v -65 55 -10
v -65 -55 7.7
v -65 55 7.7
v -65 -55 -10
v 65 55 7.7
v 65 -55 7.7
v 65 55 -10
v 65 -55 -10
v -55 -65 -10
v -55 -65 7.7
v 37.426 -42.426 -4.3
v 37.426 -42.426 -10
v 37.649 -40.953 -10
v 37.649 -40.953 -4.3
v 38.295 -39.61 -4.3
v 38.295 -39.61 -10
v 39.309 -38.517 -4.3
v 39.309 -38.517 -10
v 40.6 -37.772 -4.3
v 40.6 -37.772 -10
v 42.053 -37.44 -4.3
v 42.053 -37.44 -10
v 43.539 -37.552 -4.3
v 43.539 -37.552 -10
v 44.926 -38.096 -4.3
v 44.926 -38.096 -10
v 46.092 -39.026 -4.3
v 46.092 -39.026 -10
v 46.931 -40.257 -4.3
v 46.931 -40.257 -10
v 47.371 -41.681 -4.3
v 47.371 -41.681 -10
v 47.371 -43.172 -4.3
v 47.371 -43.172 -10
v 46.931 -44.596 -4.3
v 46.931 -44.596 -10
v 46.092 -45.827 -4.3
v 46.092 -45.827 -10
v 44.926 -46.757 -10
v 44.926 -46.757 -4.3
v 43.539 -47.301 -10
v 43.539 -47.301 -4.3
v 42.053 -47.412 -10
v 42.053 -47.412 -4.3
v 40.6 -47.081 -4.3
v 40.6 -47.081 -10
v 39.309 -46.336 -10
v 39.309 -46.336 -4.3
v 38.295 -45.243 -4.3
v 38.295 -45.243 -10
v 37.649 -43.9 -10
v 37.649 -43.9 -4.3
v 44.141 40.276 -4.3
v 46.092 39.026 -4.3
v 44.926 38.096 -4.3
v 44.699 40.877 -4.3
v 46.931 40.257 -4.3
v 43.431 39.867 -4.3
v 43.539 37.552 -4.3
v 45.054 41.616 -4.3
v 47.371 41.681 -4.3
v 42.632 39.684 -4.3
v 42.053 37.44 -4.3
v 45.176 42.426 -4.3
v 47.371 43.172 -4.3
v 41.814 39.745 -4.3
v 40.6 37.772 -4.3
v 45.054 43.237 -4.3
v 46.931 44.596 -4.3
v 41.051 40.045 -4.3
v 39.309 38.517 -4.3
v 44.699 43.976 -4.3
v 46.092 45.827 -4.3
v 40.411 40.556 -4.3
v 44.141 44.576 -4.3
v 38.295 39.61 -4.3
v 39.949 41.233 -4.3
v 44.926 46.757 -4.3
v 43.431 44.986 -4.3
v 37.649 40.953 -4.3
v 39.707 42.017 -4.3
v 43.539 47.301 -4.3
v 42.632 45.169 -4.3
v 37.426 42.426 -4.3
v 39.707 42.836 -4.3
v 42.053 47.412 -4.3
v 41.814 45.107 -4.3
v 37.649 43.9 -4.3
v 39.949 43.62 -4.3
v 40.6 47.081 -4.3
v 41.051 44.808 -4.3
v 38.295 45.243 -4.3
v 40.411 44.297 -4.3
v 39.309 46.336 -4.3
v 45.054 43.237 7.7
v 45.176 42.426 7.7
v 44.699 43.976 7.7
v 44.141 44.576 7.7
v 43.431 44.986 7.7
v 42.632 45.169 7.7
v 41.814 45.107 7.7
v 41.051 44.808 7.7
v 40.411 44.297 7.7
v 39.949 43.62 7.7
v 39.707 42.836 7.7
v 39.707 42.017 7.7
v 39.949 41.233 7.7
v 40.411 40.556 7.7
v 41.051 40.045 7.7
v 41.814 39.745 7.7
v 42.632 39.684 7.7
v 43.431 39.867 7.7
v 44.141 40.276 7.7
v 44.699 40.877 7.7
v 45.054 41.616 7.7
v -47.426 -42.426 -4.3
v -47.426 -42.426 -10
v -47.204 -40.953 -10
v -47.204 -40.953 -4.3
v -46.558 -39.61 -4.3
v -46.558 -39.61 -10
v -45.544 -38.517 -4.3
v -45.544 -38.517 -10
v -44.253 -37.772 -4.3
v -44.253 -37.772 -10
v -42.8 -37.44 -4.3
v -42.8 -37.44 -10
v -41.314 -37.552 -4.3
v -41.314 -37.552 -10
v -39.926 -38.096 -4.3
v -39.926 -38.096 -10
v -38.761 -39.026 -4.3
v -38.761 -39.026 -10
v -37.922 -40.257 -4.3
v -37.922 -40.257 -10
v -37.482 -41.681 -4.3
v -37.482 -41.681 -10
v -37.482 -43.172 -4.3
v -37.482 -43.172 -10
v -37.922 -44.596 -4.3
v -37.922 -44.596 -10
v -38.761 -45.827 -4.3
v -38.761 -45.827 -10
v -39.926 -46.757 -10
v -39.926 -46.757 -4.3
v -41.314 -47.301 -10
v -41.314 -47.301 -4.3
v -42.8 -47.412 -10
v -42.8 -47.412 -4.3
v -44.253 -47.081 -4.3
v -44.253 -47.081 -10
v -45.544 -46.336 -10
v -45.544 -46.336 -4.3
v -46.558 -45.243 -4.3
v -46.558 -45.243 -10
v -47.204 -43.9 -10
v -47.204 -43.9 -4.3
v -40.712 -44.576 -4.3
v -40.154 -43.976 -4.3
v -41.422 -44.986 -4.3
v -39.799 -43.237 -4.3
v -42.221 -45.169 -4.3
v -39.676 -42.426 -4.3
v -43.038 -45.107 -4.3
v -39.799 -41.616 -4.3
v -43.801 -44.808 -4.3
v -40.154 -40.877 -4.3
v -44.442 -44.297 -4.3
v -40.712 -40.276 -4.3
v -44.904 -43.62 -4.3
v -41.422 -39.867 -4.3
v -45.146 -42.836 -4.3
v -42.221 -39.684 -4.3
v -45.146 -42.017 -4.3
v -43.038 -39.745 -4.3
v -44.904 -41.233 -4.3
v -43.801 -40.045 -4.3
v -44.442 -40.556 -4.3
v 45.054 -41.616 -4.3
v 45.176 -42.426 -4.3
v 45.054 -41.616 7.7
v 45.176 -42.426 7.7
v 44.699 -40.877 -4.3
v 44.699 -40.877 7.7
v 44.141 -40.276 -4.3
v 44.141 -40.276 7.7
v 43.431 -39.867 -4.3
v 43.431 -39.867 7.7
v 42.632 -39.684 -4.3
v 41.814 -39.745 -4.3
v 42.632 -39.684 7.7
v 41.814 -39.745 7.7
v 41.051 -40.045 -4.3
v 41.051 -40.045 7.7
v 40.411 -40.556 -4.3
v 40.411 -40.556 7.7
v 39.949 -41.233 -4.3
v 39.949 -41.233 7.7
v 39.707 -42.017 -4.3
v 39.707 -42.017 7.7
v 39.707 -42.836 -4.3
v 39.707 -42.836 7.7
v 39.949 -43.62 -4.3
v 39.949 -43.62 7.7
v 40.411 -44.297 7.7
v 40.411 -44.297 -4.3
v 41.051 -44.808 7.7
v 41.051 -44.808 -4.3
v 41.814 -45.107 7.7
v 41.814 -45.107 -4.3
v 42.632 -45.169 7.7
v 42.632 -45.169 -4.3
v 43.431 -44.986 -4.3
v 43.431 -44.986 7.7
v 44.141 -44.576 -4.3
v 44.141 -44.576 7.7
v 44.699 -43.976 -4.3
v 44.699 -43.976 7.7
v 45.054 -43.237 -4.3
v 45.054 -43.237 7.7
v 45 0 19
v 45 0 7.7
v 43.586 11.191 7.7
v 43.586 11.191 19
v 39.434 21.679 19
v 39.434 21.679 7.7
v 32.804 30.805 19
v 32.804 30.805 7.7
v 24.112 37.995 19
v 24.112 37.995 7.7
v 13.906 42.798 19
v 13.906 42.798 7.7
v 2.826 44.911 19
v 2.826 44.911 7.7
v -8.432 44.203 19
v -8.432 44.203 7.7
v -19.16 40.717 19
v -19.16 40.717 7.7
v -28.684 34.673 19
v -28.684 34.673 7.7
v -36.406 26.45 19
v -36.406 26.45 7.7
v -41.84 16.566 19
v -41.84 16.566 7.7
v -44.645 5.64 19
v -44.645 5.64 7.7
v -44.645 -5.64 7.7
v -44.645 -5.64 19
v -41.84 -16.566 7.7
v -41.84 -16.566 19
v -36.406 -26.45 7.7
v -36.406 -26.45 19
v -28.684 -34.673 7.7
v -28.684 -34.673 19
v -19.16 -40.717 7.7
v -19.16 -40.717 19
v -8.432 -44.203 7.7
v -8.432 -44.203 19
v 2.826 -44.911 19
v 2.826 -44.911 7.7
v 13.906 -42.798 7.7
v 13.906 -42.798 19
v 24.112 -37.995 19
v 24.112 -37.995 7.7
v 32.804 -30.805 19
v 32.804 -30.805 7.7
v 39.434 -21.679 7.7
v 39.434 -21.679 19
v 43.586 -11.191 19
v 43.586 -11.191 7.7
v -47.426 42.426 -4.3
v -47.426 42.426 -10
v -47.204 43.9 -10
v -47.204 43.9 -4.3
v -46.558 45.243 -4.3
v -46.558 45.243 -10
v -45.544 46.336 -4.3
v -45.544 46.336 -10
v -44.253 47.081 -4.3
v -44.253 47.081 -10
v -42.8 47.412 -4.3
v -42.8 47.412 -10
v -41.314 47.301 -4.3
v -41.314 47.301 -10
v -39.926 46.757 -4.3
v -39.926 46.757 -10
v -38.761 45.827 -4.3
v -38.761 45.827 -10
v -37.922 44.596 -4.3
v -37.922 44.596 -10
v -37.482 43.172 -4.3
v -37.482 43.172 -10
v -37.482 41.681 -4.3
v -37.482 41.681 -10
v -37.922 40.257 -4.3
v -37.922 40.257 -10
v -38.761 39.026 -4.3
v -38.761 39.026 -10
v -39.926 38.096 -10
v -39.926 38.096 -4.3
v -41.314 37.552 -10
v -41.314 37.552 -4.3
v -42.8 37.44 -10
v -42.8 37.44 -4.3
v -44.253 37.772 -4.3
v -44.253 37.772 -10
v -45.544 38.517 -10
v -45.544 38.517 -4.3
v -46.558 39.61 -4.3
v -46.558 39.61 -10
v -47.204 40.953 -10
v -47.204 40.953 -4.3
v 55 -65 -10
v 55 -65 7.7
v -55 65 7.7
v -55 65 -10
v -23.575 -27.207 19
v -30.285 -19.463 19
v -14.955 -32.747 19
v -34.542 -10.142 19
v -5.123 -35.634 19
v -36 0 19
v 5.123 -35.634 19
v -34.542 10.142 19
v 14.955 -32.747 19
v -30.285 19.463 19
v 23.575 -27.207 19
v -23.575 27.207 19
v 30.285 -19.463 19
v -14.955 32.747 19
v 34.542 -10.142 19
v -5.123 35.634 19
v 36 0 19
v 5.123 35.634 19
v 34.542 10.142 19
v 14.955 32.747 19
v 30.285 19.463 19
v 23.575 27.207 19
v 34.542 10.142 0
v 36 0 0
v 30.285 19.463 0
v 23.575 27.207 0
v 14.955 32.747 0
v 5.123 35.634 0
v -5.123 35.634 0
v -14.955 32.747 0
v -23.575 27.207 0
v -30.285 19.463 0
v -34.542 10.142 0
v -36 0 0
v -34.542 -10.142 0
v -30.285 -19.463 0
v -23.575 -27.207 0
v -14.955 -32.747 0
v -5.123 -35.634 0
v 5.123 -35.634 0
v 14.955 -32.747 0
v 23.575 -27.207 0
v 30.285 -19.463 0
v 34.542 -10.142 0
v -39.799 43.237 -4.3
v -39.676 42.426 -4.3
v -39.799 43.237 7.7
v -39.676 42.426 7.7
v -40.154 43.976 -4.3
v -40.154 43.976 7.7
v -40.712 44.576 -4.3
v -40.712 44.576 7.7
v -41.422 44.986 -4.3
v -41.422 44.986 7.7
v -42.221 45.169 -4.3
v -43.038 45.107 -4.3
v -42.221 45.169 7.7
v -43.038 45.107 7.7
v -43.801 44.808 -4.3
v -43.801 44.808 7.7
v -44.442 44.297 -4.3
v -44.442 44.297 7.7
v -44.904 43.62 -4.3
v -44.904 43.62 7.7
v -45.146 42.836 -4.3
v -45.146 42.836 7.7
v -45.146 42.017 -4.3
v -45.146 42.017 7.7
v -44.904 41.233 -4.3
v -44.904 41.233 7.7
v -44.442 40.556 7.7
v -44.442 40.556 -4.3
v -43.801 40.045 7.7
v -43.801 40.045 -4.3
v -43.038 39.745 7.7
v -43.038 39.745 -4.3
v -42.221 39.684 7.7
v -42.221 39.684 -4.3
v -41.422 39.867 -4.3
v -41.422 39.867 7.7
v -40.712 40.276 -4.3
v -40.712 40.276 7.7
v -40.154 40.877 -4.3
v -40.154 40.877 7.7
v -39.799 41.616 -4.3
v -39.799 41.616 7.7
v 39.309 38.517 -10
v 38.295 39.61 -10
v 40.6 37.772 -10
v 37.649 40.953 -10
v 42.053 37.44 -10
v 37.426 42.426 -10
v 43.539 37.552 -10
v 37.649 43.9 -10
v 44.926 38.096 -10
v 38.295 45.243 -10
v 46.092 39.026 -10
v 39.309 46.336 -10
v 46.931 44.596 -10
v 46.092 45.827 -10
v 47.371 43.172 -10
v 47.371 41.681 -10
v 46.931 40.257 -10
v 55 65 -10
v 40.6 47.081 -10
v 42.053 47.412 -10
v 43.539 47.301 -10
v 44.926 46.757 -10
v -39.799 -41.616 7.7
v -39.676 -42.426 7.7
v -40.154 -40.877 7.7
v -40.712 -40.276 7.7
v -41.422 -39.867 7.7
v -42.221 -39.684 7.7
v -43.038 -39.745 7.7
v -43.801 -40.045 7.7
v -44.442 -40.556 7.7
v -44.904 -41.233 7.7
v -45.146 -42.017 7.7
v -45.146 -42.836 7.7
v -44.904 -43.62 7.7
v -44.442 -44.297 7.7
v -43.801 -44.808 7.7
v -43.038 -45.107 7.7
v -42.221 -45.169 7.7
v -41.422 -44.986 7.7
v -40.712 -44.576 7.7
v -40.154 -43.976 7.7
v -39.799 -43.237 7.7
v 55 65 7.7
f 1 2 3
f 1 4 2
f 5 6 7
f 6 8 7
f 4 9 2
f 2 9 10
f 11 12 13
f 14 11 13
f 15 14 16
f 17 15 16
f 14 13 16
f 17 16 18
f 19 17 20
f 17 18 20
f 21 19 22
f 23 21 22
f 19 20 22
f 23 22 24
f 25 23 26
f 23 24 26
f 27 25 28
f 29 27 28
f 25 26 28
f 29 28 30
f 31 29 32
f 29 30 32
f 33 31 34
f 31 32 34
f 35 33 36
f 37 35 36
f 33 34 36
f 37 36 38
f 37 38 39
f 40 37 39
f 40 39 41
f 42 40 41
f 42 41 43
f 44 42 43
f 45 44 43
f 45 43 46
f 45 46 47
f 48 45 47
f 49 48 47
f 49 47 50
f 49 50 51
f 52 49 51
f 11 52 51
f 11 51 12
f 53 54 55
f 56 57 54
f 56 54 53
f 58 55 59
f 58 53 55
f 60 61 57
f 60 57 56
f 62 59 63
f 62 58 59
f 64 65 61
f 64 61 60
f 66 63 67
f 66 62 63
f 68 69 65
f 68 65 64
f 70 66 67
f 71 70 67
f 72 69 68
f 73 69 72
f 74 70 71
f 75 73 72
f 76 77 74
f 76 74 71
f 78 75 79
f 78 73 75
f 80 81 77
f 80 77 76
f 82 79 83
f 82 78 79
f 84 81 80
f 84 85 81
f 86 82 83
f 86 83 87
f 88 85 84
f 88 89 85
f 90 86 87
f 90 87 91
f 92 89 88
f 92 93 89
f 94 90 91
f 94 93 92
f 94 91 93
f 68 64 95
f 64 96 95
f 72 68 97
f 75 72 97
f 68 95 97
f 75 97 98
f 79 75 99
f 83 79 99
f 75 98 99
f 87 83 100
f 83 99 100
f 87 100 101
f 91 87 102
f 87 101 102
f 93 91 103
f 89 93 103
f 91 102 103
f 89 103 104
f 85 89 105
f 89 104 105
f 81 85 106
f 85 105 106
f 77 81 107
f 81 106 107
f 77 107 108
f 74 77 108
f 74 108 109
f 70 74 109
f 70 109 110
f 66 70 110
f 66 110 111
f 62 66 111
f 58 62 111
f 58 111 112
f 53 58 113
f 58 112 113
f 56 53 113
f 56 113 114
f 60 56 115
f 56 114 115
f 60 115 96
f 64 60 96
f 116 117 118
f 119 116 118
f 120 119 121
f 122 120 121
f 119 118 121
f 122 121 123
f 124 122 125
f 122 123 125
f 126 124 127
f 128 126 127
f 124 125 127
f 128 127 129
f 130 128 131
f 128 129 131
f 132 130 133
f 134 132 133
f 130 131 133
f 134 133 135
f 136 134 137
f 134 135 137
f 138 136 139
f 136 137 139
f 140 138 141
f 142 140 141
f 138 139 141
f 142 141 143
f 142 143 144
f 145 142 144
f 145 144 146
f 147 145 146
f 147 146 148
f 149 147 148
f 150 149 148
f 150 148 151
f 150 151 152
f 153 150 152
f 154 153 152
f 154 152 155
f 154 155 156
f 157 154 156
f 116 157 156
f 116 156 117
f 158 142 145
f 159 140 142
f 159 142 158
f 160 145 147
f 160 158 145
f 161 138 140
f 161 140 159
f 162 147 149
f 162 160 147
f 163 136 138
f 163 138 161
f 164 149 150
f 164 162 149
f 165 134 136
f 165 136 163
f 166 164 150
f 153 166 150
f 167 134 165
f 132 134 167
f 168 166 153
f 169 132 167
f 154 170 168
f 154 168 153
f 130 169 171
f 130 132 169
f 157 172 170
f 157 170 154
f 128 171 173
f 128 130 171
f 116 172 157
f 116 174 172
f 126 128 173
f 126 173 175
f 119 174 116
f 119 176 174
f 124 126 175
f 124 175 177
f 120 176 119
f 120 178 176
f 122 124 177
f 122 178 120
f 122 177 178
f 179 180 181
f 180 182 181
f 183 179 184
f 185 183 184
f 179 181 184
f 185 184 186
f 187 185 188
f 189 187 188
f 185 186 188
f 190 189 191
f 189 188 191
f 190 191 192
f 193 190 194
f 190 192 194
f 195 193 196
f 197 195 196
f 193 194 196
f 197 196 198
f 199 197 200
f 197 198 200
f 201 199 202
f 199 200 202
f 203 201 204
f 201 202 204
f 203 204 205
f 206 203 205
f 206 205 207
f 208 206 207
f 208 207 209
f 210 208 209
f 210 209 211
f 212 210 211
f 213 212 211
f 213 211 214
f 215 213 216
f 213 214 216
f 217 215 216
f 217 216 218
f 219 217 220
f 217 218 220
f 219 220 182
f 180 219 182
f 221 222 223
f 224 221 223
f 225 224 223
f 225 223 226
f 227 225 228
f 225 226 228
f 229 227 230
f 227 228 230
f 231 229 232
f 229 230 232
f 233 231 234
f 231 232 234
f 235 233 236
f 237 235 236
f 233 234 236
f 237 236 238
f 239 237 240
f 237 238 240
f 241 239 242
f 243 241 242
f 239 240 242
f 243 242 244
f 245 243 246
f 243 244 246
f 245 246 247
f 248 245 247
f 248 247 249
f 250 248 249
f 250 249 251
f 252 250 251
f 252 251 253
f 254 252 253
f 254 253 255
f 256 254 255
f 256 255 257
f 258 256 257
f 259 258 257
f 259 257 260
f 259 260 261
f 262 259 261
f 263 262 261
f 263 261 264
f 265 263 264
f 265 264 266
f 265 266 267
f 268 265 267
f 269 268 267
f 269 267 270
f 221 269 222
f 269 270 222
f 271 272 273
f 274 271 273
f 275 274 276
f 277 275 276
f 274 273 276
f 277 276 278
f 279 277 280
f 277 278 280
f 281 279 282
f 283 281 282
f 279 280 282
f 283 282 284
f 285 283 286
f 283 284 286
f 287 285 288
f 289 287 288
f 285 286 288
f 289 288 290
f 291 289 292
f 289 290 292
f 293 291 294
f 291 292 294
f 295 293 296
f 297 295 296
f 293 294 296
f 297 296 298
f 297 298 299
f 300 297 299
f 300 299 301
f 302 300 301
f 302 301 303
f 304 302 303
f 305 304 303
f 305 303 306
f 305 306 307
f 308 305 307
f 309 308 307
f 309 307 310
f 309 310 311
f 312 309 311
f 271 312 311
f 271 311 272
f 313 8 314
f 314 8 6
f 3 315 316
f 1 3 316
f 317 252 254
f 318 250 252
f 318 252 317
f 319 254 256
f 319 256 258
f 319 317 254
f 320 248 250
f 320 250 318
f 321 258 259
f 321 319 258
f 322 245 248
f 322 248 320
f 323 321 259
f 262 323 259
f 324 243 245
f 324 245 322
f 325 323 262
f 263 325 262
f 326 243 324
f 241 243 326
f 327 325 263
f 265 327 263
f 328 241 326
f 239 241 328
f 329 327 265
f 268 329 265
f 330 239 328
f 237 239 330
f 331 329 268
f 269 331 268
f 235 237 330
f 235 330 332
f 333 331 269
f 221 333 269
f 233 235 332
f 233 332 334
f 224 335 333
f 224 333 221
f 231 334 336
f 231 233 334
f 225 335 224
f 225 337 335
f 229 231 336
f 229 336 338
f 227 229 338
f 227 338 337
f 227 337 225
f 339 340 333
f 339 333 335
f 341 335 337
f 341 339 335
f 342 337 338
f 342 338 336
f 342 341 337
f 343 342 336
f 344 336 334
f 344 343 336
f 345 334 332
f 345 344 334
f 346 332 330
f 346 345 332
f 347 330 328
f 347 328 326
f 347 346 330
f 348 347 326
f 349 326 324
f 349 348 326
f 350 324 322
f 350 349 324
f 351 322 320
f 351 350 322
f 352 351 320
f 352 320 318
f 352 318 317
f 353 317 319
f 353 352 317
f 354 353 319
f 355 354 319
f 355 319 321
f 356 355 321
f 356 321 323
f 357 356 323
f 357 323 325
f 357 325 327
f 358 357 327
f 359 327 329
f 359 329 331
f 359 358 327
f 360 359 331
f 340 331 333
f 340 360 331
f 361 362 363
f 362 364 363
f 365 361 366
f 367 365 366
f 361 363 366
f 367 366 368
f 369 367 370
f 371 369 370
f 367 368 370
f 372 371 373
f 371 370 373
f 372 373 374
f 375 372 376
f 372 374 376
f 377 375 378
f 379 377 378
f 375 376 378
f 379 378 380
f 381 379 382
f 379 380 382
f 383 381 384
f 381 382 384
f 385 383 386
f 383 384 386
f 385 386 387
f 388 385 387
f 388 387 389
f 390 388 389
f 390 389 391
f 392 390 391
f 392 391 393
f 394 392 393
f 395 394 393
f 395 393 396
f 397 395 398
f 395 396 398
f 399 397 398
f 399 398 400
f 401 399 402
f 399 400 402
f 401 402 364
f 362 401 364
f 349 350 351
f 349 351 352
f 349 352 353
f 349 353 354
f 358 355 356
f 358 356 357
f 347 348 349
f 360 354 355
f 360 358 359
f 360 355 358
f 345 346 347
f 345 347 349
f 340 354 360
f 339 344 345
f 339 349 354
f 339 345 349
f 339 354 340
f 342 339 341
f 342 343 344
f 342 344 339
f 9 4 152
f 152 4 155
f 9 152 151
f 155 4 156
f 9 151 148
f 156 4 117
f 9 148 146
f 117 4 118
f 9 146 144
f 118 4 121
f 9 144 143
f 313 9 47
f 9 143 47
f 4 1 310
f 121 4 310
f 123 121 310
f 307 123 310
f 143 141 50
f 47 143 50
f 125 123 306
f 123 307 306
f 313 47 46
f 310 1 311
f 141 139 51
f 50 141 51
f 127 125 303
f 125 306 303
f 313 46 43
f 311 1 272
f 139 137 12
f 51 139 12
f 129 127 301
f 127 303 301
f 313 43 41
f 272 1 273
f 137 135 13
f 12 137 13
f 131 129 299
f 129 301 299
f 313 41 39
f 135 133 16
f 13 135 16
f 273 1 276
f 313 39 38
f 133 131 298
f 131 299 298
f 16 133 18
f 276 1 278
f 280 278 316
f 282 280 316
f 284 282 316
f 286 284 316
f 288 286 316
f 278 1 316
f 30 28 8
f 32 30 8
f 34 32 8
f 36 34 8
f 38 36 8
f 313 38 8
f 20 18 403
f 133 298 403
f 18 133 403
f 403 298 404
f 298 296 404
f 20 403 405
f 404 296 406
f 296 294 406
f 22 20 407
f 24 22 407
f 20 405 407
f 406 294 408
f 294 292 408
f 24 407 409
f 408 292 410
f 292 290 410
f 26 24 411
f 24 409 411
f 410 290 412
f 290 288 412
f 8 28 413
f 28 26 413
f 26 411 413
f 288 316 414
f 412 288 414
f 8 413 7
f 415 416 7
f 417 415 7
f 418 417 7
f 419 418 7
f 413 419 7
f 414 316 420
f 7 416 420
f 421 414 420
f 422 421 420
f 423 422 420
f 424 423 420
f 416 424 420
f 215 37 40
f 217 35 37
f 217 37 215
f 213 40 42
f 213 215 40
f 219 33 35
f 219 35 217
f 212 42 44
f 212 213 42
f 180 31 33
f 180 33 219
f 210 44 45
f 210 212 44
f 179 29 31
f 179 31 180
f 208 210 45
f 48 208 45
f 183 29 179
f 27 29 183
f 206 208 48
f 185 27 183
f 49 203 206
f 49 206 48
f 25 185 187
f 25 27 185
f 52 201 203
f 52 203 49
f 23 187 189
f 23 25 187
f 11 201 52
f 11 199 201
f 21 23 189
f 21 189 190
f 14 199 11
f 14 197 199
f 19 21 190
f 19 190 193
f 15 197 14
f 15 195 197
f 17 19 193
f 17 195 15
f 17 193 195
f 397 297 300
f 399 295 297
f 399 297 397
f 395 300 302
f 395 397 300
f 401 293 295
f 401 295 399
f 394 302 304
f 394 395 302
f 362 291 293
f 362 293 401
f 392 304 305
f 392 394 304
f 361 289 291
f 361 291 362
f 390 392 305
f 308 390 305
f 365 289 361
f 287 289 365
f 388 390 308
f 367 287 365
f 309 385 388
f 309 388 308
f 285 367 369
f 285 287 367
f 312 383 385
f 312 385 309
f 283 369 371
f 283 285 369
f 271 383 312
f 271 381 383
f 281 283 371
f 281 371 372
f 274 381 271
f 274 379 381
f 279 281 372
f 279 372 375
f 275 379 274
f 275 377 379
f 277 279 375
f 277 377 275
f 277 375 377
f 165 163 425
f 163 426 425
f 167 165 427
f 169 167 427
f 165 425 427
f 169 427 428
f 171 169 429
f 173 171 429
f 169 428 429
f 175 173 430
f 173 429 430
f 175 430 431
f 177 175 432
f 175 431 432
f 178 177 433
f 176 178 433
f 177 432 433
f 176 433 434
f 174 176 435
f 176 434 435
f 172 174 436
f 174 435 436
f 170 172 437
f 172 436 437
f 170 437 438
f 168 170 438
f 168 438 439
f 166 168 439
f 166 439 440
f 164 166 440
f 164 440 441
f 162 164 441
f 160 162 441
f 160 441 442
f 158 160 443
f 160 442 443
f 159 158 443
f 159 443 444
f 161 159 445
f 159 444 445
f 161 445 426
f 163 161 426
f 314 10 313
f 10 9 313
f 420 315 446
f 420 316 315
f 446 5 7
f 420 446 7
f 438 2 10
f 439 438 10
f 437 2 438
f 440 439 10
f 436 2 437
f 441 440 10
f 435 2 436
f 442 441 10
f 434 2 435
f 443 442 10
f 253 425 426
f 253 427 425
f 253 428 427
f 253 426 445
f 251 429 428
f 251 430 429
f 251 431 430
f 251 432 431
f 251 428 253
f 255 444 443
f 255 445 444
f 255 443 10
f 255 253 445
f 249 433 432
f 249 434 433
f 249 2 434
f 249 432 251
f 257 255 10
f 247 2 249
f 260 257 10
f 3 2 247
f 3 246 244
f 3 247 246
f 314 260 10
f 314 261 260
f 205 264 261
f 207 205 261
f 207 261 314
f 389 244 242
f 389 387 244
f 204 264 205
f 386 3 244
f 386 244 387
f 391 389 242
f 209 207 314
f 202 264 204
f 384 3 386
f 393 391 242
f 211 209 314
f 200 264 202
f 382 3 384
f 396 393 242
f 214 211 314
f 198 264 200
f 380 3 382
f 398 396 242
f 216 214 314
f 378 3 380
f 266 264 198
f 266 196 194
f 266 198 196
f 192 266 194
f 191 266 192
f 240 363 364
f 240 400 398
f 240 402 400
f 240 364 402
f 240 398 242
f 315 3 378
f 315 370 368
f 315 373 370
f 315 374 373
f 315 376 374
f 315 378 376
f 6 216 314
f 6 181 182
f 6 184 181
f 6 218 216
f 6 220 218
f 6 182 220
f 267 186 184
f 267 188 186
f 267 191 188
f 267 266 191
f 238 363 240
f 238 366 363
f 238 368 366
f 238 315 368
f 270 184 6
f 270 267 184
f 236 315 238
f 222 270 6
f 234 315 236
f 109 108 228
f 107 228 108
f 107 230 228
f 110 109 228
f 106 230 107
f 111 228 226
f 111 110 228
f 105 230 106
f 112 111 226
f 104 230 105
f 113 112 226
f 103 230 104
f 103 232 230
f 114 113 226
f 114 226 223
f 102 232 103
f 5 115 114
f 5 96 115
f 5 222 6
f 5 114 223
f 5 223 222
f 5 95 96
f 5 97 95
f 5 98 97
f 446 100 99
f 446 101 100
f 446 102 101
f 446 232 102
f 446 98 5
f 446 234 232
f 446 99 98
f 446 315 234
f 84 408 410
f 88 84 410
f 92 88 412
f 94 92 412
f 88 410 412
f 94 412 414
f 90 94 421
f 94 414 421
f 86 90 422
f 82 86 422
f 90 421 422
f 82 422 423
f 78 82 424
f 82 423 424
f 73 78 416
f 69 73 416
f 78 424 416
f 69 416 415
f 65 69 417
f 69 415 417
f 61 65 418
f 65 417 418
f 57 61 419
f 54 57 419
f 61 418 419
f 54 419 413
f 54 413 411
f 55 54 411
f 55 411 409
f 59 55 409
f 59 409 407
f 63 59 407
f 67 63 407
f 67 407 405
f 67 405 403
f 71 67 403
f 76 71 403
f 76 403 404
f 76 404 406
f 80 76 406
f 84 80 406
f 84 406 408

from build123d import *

# Parameters (mm, degrees)
SKETCH_1_R                = 45
SKETCH_1_R_2              = 36
EXTRUDE_1_DEPTH           = 19
SKETCH_1_3_W              = 130
SKETCH_1_3_H              = 130
SKETCH_1_3_R              = 2.5
EXTRUDE_2_DEPTH           = 10
EXTRUDE_START             = 7.7
SKETCH_1_4_W              = 130
SKETCH_1_4_H              = 130
SKETCH_1_4_R              = 2.5
SKETCH_1_4_R_2            = 45
EXTRUDE_3_DEPTH           = 7.7
HOLE_WIZARD_1_D           = 5.5
HOLE_WIZARD_1_CBORE_D     = 10
HOLE_WIZARD_1_CBORE_DEPTH = 5.7
CHAMFER_1_SIZE            = 10


with BuildPart() as part:
    # 草图1 → 凸台-拉伸1 (new body)
    with BuildSketch(Plane.XY):
        Circle(SKETCH_1_R)
        Circle(SKETCH_1_R_2, mode=Mode.SUBTRACT)
    extrude(amount=EXTRUDE_1_DEPTH)

    # 草图1<3> → 凸台-拉伸2 (add)
    with BuildSketch(Plane.XY):
        Rectangle(SKETCH_1_3_W, SKETCH_1_3_H)
        with Locations((-42.426406871, -42.426406871)):
            Circle(SKETCH_1_3_R, mode=Mode.SUBTRACT)
        with Locations((42.426406871, -42.426406871)):
            Circle(SKETCH_1_3_R, mode=Mode.SUBTRACT)
        with Locations((-42.426406871, 42.426406871)):
            Circle(SKETCH_1_3_R, mode=Mode.SUBTRACT)
        with Locations((42.426406871, 42.426406871)):
            Circle(SKETCH_1_3_R, mode=Mode.SUBTRACT)
    extrude(amount=-EXTRUDE_2_DEPTH)

    # 草图1<4> → 凸台-拉伸3 (add)
    with BuildSketch(Plane.XY.offset(EXTRUDE_START)):
        Rectangle(SKETCH_1_4_W, SKETCH_1_4_H)
        with Locations((-42.426406871, -42.426406871)):
            Circle(SKETCH_1_4_R, mode=Mode.SUBTRACT)
        with Locations((42.426406871, -42.426406871)):
            Circle(SKETCH_1_4_R, mode=Mode.SUBTRACT)
        with Locations((-42.426406871, 42.426406871)):
            Circle(SKETCH_1_4_R, mode=Mode.SUBTRACT)
        Circle(SKETCH_1_4_R_2, mode=Mode.SUBTRACT)
        with Locations((42.426406871, 42.426406871)):
            Circle(SKETCH_1_4_R, mode=Mode.SUBTRACT)
    extrude(amount=-EXTRUDE_3_DEPTH)

    # 打孔尺寸(%根据)内六角圆柱头螺钉的类型1 (through all)
    with Locations(Plane(origin=(0, 0, -10), x_dir=(-1, 0, 0), z_dir=(0, 0, -1))):
        with Locations((42.426406871, 42.426406871), (-42.426406871, 42.426406871), (42.426406871, -42.426406871), (-42.426406871, -42.426406871)):
            CounterBoreHole(HOLE_WIZARD_1_D / 2, HOLE_WIZARD_1_CBORE_D / 2, HOLE_WIZARD_1_CBORE_DEPTH)

    # 倒角1
    chamfer_1_edges = [part.edges().sort_by_distance(p)[0] for p in [
        (-65, -65, -1.15),
        (-65, 65, -1.15),
        (65, -65, -1.15),
        (65, 65, -1.15),
    ]]
    chamfer(chamfer_1_edges, length=CHAMFER_1_SIZE)


solid = part.part
